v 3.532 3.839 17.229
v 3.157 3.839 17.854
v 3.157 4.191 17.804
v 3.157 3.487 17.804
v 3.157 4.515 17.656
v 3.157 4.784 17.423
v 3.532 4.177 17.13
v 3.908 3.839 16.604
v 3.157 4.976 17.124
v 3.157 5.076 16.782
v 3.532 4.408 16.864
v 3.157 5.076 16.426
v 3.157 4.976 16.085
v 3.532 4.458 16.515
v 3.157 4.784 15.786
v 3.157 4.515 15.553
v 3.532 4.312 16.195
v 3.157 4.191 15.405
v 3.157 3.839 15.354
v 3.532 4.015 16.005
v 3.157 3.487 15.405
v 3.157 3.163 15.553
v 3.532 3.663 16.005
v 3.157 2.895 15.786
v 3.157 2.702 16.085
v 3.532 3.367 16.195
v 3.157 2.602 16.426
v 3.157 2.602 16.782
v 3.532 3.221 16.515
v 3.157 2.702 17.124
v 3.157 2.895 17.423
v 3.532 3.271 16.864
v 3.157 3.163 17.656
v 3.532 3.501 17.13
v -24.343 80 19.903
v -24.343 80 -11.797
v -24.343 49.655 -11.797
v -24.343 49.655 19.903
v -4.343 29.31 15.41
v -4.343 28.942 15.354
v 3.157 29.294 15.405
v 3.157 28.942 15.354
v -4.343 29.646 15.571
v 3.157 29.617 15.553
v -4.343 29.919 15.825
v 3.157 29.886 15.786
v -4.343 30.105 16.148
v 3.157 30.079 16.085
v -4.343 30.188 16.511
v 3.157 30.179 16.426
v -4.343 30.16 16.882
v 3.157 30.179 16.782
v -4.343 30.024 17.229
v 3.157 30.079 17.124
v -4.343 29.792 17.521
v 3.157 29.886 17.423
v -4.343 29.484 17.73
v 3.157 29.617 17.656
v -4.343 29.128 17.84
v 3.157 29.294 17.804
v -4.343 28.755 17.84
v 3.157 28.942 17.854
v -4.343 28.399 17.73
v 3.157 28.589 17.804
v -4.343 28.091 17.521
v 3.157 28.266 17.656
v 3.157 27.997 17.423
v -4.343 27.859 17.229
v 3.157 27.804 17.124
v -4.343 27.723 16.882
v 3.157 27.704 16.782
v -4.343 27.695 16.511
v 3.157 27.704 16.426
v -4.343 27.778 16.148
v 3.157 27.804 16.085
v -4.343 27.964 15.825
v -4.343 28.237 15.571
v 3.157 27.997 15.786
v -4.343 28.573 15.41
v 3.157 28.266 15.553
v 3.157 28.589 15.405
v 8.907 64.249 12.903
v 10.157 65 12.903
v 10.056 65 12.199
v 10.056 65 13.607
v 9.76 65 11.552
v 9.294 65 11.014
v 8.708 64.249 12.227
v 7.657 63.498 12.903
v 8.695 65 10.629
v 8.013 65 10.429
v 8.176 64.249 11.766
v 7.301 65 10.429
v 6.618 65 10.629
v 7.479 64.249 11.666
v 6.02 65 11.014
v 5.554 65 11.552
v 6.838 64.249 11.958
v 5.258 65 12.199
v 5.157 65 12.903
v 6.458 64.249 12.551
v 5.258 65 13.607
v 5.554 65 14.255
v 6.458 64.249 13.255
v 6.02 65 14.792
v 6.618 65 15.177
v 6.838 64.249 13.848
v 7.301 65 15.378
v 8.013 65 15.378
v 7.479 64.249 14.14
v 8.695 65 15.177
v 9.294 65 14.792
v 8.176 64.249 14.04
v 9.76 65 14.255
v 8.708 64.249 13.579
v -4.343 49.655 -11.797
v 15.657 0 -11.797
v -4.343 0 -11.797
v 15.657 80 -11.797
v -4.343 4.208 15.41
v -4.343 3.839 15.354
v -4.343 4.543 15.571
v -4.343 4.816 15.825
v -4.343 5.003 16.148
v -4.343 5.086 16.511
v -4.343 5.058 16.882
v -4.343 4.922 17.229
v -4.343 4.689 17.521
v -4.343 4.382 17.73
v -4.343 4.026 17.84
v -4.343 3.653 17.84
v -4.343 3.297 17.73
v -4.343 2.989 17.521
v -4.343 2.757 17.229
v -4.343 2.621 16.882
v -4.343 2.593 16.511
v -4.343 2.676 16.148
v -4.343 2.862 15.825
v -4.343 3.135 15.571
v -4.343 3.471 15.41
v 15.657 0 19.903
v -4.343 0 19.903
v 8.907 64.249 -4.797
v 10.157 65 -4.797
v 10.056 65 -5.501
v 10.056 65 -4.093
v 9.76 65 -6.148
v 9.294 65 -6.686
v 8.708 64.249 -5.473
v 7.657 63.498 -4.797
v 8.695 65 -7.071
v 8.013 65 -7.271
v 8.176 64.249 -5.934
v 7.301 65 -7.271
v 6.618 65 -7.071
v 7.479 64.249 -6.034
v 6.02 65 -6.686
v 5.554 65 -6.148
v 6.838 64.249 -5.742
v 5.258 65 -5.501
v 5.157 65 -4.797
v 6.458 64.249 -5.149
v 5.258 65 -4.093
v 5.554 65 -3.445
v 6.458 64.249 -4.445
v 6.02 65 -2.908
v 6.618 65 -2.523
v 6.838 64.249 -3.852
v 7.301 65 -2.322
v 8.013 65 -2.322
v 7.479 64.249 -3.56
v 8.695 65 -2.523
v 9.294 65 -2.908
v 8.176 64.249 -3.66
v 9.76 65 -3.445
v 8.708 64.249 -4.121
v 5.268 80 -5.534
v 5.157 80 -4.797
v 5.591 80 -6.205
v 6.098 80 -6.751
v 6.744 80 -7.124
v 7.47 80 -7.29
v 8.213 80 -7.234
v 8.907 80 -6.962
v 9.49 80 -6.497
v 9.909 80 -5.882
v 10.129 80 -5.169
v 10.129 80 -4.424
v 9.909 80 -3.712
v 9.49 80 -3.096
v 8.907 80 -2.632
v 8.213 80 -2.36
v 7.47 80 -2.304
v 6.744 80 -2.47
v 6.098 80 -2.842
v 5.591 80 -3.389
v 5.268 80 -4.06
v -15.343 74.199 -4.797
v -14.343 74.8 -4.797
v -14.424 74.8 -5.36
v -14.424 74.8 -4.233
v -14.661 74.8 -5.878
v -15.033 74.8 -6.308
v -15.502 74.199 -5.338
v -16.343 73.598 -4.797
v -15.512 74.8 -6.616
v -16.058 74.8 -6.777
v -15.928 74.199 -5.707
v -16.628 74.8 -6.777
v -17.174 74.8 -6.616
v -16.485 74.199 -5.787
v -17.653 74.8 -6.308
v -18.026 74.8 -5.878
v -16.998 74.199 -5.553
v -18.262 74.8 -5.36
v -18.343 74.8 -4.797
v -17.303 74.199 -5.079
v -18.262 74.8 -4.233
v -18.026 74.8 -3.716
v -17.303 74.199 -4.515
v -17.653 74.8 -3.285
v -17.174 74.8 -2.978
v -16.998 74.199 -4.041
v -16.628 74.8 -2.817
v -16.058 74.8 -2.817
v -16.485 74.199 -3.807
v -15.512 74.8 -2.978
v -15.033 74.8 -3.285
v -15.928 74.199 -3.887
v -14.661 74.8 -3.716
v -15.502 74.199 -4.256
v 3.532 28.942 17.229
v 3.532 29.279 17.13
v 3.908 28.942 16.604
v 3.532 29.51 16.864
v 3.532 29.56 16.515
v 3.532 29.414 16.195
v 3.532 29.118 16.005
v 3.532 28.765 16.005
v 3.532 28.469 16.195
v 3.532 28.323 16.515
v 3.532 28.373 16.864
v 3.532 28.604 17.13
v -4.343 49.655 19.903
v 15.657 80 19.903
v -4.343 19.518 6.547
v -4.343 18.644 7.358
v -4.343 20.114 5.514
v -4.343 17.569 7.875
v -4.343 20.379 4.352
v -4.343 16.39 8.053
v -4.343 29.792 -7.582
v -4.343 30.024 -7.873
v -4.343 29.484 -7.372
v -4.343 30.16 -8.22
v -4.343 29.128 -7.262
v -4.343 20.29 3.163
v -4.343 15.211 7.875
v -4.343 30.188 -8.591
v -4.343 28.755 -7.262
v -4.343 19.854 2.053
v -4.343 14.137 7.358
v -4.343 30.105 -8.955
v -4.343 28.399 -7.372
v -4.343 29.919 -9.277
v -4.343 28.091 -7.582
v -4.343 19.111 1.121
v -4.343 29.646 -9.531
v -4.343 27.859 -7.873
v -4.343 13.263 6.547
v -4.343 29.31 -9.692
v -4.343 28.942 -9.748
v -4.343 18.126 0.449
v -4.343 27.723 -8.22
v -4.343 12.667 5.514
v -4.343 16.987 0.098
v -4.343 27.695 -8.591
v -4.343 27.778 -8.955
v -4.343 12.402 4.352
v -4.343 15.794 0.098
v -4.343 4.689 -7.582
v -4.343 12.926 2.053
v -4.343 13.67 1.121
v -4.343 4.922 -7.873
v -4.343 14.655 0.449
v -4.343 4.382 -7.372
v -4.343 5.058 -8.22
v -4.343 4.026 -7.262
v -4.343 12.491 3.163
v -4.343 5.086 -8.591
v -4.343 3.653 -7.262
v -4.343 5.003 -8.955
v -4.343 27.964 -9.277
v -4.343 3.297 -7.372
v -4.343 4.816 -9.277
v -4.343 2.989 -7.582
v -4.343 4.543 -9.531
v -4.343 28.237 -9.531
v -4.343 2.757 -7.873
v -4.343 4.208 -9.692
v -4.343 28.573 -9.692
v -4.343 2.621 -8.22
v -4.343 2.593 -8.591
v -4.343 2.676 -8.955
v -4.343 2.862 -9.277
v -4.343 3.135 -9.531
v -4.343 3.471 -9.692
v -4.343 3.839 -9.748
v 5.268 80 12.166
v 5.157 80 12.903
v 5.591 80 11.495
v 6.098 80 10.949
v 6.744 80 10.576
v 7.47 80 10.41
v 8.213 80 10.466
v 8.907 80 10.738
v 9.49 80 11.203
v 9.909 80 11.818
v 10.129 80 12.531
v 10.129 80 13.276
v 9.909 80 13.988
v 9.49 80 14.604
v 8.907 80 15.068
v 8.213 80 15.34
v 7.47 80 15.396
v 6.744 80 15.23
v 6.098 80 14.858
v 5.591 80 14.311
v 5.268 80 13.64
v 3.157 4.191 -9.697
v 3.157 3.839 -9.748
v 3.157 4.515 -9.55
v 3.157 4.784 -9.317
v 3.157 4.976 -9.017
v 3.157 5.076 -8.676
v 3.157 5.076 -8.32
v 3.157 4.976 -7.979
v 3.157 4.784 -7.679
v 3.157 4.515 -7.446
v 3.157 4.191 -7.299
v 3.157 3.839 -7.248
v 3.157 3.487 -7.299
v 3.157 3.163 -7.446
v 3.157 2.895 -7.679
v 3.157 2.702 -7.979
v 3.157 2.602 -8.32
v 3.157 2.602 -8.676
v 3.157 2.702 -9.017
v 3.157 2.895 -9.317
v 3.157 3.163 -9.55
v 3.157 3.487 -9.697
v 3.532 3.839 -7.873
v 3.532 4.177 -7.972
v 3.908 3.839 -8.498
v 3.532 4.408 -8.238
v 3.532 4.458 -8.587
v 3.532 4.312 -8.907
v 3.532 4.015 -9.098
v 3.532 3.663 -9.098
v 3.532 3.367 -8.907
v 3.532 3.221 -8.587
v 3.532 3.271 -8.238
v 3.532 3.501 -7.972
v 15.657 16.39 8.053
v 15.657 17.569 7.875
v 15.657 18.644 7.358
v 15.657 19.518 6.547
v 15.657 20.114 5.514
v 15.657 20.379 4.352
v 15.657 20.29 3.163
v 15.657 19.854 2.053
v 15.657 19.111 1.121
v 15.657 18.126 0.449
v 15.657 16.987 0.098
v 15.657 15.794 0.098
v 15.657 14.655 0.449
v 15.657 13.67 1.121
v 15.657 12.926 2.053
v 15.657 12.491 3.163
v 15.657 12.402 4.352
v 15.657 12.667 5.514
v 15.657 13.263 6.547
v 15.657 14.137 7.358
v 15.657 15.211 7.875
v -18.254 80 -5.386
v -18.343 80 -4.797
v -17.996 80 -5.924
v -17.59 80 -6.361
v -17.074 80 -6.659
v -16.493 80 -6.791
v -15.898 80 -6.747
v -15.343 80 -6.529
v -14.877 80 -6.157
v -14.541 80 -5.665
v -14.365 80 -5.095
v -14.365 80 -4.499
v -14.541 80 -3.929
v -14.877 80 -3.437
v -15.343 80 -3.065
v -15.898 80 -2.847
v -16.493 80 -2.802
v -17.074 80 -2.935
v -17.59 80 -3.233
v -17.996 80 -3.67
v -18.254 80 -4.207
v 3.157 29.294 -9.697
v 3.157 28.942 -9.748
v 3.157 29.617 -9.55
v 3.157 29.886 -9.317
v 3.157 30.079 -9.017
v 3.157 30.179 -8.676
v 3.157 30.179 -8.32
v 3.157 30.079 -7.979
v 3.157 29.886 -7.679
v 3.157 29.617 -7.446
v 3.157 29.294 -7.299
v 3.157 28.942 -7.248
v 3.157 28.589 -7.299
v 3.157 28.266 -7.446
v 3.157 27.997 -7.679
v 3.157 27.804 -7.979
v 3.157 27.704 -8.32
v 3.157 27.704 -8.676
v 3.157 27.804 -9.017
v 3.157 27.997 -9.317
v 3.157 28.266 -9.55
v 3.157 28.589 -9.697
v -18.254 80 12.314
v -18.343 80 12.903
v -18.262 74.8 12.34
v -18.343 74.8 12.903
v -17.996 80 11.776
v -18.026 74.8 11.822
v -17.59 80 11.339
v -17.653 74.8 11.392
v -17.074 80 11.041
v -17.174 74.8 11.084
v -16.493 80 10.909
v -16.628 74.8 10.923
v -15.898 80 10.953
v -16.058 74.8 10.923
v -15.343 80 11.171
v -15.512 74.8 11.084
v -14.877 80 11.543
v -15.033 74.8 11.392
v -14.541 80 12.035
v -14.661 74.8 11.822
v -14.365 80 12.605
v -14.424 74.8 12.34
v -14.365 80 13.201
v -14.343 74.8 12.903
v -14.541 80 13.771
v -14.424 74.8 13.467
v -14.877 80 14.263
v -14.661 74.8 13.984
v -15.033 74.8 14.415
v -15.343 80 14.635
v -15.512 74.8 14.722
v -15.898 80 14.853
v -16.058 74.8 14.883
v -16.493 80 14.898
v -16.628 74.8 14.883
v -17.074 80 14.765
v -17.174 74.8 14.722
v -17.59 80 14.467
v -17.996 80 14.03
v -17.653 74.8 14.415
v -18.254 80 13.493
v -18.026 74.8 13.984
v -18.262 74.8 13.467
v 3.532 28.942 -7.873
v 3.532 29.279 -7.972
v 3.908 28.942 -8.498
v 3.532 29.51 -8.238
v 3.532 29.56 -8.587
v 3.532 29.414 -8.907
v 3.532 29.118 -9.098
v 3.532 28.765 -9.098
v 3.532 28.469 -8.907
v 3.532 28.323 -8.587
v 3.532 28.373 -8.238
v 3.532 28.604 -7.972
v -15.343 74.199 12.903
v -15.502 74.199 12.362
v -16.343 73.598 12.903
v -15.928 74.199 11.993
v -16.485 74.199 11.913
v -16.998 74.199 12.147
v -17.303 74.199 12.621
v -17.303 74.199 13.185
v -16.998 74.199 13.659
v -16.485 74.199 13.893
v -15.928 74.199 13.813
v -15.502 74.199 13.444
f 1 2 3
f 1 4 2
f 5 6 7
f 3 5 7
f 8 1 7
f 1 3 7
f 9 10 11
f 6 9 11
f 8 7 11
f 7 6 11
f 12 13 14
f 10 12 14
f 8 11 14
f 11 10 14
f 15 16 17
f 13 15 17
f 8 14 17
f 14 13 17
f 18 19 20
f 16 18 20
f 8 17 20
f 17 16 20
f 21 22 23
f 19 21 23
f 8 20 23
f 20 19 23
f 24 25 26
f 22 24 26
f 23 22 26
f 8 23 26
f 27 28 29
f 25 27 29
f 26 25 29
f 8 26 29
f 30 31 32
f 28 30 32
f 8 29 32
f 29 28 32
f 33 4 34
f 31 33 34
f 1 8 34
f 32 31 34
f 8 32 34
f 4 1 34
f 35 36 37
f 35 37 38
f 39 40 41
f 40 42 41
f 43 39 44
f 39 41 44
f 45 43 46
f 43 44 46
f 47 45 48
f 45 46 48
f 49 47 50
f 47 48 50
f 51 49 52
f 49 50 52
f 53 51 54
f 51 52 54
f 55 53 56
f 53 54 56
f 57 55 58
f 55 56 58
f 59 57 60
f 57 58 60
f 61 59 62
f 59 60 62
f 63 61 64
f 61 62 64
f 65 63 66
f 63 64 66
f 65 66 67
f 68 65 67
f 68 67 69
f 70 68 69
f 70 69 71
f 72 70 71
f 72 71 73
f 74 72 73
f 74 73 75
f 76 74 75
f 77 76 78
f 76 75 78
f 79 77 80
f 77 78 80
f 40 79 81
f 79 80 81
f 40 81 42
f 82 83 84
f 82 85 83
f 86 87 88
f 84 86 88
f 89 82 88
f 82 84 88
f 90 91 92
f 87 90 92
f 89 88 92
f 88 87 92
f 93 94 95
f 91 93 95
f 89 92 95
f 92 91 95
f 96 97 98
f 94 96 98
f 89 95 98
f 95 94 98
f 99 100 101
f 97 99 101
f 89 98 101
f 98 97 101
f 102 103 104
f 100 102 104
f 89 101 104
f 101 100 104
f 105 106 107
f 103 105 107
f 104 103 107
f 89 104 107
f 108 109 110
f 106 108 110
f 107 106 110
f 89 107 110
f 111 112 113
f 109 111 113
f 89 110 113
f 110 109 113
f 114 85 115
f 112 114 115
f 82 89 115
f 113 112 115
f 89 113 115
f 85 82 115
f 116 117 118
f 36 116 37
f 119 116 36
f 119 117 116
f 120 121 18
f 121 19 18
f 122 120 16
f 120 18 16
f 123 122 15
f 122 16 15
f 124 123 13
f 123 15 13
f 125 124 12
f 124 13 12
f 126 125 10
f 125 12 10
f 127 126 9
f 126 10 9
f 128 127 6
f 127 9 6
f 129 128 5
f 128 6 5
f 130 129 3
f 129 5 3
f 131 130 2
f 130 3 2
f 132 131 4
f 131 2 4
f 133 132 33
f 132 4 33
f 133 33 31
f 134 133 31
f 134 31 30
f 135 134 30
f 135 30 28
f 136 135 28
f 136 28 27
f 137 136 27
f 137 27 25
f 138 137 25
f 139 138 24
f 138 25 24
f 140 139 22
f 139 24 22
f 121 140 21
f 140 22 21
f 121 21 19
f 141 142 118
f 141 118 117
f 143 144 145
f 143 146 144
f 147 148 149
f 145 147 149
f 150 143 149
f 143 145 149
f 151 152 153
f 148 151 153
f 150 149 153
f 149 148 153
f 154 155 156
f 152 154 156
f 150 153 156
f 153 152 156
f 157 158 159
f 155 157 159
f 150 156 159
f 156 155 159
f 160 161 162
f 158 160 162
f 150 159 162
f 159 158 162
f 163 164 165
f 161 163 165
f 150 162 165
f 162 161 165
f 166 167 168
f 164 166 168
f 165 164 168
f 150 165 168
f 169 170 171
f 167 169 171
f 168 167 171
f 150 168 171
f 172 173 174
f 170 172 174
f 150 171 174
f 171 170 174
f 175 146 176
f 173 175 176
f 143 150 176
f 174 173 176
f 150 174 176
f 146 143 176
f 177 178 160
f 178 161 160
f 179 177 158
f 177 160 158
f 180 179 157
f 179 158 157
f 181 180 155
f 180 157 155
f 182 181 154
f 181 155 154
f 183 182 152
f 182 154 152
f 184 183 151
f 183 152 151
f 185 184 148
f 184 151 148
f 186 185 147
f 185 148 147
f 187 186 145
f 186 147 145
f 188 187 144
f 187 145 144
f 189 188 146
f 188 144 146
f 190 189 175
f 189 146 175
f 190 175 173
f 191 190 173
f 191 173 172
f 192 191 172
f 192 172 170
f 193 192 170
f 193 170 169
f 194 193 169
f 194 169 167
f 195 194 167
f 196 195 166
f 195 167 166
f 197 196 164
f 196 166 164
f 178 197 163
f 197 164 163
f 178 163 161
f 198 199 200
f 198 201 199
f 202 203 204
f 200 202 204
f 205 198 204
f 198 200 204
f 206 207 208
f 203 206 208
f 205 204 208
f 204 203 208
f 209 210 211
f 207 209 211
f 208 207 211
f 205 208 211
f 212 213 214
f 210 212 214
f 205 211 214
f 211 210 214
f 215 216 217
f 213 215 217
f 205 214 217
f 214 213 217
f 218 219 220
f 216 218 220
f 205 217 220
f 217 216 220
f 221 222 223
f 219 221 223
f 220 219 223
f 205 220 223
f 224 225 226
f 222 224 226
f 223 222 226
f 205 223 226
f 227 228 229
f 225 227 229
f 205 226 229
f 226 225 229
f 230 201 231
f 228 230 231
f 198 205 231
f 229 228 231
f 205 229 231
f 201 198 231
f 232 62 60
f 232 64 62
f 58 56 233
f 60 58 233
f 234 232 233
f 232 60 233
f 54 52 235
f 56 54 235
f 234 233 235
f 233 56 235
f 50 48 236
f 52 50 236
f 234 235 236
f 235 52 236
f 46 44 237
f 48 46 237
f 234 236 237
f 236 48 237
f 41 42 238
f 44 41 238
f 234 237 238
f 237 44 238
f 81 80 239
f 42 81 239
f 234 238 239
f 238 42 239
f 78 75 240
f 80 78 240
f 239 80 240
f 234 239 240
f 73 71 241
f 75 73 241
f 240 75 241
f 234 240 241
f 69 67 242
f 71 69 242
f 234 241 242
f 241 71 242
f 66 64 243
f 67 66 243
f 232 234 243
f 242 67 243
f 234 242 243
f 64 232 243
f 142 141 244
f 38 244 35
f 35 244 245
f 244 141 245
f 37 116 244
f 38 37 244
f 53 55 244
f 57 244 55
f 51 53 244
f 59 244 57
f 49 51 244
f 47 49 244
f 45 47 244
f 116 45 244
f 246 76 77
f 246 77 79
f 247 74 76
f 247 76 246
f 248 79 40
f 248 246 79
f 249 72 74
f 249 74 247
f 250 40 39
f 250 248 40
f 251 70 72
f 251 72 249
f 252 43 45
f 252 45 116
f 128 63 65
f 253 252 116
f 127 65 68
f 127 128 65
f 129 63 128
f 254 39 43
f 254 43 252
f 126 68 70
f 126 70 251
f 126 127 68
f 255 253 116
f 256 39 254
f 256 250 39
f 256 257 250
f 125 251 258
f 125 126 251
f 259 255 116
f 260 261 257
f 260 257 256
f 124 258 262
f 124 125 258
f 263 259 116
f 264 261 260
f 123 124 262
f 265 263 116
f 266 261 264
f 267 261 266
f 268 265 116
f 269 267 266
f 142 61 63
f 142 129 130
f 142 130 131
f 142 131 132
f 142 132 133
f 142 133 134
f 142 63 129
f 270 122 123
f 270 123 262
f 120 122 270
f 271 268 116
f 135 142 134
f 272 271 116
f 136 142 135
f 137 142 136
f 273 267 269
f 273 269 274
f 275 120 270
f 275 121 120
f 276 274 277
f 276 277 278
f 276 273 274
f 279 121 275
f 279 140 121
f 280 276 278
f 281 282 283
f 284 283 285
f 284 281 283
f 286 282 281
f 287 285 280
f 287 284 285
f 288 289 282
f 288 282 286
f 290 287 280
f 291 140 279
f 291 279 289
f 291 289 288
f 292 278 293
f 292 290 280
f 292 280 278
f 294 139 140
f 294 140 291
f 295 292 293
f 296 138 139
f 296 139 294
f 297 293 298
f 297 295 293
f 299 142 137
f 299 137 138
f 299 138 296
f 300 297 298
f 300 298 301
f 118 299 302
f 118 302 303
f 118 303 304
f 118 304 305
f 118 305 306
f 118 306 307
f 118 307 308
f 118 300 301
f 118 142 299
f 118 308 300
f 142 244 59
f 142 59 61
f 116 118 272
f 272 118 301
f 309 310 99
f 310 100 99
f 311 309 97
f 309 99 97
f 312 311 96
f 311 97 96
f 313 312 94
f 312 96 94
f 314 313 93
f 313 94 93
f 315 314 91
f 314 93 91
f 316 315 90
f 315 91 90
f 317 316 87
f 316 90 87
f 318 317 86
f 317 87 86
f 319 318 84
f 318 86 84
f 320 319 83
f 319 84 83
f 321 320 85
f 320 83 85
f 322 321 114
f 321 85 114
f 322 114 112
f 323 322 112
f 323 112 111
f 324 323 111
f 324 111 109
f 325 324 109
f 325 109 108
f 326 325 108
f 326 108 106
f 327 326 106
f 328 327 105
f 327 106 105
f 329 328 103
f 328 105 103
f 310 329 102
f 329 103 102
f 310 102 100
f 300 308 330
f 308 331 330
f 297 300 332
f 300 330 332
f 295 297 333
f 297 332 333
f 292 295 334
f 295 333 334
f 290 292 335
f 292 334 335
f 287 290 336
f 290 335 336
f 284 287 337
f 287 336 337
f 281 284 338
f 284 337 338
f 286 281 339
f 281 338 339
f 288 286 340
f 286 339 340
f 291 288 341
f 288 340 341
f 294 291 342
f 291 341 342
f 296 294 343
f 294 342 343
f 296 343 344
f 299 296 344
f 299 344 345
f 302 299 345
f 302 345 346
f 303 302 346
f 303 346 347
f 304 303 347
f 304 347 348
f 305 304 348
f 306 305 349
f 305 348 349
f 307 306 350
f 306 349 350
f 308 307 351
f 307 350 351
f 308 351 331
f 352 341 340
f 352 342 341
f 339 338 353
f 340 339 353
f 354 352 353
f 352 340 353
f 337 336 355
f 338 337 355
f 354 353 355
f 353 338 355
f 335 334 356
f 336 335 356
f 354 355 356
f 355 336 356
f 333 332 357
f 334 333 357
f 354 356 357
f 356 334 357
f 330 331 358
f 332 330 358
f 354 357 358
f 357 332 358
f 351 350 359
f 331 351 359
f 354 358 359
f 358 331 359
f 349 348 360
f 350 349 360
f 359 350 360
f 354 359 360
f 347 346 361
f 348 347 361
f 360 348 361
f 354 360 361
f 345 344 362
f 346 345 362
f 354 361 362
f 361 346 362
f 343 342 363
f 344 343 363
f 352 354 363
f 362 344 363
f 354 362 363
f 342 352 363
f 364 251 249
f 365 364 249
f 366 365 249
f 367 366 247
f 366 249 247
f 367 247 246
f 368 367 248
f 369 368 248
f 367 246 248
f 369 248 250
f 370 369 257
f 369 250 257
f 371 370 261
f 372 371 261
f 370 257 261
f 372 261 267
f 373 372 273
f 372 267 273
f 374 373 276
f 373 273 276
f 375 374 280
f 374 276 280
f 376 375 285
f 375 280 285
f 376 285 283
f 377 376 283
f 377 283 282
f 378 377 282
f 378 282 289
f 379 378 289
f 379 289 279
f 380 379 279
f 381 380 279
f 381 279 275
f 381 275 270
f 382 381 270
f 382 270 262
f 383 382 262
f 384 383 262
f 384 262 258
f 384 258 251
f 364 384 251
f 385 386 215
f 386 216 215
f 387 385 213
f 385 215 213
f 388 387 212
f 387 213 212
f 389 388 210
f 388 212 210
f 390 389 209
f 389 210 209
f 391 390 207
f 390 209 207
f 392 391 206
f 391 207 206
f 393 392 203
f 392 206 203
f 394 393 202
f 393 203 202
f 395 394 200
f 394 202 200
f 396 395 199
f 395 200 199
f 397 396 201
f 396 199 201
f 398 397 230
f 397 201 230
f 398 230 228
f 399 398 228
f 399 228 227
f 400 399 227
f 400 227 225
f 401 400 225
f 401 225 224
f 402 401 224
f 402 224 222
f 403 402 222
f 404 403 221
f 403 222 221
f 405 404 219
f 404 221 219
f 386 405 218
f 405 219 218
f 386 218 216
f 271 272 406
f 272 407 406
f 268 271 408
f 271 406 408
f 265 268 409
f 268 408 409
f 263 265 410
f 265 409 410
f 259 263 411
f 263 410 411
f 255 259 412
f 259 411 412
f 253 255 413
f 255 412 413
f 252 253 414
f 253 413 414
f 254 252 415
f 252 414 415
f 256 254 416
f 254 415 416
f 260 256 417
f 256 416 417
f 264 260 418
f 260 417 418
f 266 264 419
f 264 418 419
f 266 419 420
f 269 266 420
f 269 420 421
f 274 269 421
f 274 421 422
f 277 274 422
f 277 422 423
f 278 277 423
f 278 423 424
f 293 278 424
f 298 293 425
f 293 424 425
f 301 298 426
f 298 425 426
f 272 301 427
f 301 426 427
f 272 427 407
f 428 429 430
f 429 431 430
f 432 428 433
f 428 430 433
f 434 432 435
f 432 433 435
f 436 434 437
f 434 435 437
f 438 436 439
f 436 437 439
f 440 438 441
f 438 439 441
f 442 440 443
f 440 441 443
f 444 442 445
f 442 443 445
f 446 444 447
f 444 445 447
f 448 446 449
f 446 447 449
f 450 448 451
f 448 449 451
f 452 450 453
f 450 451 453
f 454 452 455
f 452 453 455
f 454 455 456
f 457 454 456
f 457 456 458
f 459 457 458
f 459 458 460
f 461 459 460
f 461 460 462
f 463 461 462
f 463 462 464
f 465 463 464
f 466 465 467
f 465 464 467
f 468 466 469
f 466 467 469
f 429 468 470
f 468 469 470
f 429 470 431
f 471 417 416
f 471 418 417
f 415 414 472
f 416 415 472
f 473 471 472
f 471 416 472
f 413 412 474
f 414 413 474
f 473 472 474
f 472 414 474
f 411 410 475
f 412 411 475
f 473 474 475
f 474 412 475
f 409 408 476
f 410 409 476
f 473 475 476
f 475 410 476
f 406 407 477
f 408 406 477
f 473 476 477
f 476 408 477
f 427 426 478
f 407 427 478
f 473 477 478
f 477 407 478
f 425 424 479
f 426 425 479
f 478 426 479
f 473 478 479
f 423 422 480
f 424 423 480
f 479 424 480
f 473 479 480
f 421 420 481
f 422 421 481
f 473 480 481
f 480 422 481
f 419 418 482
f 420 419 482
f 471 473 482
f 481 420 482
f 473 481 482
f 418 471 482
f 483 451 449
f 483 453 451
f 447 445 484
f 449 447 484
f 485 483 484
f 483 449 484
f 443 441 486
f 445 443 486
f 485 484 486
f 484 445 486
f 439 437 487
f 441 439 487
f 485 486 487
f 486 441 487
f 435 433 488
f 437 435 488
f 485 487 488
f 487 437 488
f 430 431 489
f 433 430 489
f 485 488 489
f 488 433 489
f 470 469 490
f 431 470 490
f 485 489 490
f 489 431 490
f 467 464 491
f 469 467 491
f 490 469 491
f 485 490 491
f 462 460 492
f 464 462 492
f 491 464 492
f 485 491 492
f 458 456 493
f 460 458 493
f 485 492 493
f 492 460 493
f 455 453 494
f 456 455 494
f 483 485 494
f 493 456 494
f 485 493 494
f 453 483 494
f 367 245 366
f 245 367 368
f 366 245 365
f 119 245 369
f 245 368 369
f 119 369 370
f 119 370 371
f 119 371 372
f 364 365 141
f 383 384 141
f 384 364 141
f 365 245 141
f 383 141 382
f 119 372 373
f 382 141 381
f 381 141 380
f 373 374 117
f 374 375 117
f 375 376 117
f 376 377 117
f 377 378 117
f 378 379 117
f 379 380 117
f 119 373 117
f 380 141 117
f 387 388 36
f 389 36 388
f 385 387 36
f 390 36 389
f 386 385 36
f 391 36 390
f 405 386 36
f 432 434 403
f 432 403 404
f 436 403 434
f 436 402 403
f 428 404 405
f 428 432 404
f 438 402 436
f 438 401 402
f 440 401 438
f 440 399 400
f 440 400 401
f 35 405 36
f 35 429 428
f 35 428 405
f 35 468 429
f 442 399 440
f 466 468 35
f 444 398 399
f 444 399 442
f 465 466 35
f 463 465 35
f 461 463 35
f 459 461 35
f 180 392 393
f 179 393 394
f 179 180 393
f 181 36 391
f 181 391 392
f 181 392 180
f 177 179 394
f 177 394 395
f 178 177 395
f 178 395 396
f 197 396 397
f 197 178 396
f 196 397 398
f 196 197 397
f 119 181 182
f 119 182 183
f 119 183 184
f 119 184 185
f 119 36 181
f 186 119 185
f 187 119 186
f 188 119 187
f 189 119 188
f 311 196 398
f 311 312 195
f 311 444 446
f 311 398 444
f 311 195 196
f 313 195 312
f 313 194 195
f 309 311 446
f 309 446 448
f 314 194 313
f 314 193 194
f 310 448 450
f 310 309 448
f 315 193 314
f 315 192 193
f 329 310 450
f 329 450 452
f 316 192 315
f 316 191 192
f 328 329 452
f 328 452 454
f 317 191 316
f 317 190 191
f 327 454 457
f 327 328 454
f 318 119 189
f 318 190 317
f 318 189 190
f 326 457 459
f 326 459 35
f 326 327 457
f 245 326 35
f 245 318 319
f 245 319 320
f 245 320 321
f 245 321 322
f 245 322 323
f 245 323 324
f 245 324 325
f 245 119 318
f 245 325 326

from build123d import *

# Parameters (mm, degrees)
SKETCH1_W                 = 20
SKETCH1_H                 = 31.7
BOSS_EXTRUDE1_DEPTH       = 80
CUT_EXTRUDE1_REACH        = 22
SKETCH2_R                 = 4
M3X0_5_TAPPED_HOLE1_D     = 2.5
M3X0_5_TAPPED_HOLE1_DEPTH = 7.5
M3X0_5_TAPPED_HOLE1_TIP   = 0.751075774
SKETCH5_W                 = 31.7
SKETCH5_H                 = 30.344547228
BOSS_EXTRUDE2_DEPTH       = 20
F_4_0MM_DOWEL_HOLE1_D     = 4
F_4_0MM_DOWEL_HOLE1_DEPTH = 5.2
F_4_0MM_DOWEL_HOLE1_TIP   = 1.201721238
M6X1_0_TAPPED_HOLE1_D     = 5
M6X1_0_TAPPED_HOLE1_DEPTH = 15
M6X1_0_TAPPED_HOLE1_TIP   = 1.502151548


with BuildPart() as part:
    # Sketch1 → Boss-Extrude1 (new body)
    with BuildSketch(Plane(origin=(0, 0, 0), x_dir=(1, 0, 0), z_dir=(0, 1, 0))):
        with Locations((5.656892123, -4.053125)):
            Rectangle(SKETCH1_W, SKETCH1_H)
    extrude(amount=BOSS_EXTRUDE1_DEPTH)

    # Sketch2 → Cut-Extrude1 (cut, up to next)
    with BuildSketch(Plane.ZY.offset(4.343107877), mode=Mode.PRIVATE) as cut_extrude1_sk1:
        with Locations((4.053125, 16.390354737)):
            Circle(SKETCH2_R)
    cut_extrude1_tool1 = extrude(cut_extrude1_sk1.sketch, amount=-CUT_EXTRUDE1_REACH, mode=Mode.PRIVATE) & part.part
    add(cut_extrude1_tool1.solids().sort_by_distance((-4.343108, 16.390355, 4.053125))[0], mode=Mode.SUBTRACT)

    # M3x0.5 Tapped Hole1
    with Locations(Plane.ZY.offset(4.343107877)):
        with Locations((16.604270366, 28.941500103), (-8.498020366, 28.941500103), (-8.498020366, 3.839209371), (16.604270366, 3.839209371)):
            Hole(M3X0_5_TAPPED_HOLE1_D / 2, depth=M3X0_5_TAPPED_HOLE1_DEPTH)
            with Locations((0, 0, -(M3X0_5_TAPPED_HOLE1_DEPTH + M3X0_5_TAPPED_HOLE1_TIP / 2))):  # 118° drill point
                Cone(0, M3X0_5_TAPPED_HOLE1_D / 2, M3X0_5_TAPPED_HOLE1_TIP, mode=Mode.SUBTRACT)

    # Sketch5 → Boss-Extrude2 (add)
    with BuildSketch(Plane.ZY.offset(4.343107877)):
        with Locations((4.053125, 64.827726386)):
            Rectangle(SKETCH5_W, SKETCH5_H)
    extrude(amount=BOSS_EXTRUDE2_DEPTH)

    # Ø4.0mm Dowel Hole1
    with Locations(Plane(origin=(0, 80, 0), x_dir=(1, 0, 0), z_dir=(0, 1, 0))):
        with Locations((-16.343107877, 4.796875), (-16.343107877, -12.903125)):
            Hole(F_4_0MM_DOWEL_HOLE1_D / 2, depth=F_4_0MM_DOWEL_HOLE1_DEPTH)
            with Locations((0, 0, -(F_4_0MM_DOWEL_HOLE1_DEPTH + F_4_0MM_DOWEL_HOLE1_TIP / 2))):  # 118° drill point
                Cone(0, F_4_0MM_DOWEL_HOLE1_D / 2, F_4_0MM_DOWEL_HOLE1_TIP, mode=Mode.SUBTRACT)

    # M6x1.0 Tapped Hole1
    with Locations(Plane(origin=(0, 80, 0), x_dir=(1, 0, 0), z_dir=(0, 1, 0))):
        with Locations((7.656892123, 4.796875), (7.656892123, -12.903125)):
            Hole(M6X1_0_TAPPED_HOLE1_D / 2, depth=M6X1_0_TAPPED_HOLE1_DEPTH)
            with Locations((0, 0, -(M6X1_0_TAPPED_HOLE1_DEPTH + M6X1_0_TAPPED_HOLE1_TIP / 2))):  # 118° drill point
                Cone(0, M6X1_0_TAPPED_HOLE1_D / 2, M6X1_0_TAPPED_HOLE1_TIP, mode=Mode.SUBTRACT)


solid = part.part
